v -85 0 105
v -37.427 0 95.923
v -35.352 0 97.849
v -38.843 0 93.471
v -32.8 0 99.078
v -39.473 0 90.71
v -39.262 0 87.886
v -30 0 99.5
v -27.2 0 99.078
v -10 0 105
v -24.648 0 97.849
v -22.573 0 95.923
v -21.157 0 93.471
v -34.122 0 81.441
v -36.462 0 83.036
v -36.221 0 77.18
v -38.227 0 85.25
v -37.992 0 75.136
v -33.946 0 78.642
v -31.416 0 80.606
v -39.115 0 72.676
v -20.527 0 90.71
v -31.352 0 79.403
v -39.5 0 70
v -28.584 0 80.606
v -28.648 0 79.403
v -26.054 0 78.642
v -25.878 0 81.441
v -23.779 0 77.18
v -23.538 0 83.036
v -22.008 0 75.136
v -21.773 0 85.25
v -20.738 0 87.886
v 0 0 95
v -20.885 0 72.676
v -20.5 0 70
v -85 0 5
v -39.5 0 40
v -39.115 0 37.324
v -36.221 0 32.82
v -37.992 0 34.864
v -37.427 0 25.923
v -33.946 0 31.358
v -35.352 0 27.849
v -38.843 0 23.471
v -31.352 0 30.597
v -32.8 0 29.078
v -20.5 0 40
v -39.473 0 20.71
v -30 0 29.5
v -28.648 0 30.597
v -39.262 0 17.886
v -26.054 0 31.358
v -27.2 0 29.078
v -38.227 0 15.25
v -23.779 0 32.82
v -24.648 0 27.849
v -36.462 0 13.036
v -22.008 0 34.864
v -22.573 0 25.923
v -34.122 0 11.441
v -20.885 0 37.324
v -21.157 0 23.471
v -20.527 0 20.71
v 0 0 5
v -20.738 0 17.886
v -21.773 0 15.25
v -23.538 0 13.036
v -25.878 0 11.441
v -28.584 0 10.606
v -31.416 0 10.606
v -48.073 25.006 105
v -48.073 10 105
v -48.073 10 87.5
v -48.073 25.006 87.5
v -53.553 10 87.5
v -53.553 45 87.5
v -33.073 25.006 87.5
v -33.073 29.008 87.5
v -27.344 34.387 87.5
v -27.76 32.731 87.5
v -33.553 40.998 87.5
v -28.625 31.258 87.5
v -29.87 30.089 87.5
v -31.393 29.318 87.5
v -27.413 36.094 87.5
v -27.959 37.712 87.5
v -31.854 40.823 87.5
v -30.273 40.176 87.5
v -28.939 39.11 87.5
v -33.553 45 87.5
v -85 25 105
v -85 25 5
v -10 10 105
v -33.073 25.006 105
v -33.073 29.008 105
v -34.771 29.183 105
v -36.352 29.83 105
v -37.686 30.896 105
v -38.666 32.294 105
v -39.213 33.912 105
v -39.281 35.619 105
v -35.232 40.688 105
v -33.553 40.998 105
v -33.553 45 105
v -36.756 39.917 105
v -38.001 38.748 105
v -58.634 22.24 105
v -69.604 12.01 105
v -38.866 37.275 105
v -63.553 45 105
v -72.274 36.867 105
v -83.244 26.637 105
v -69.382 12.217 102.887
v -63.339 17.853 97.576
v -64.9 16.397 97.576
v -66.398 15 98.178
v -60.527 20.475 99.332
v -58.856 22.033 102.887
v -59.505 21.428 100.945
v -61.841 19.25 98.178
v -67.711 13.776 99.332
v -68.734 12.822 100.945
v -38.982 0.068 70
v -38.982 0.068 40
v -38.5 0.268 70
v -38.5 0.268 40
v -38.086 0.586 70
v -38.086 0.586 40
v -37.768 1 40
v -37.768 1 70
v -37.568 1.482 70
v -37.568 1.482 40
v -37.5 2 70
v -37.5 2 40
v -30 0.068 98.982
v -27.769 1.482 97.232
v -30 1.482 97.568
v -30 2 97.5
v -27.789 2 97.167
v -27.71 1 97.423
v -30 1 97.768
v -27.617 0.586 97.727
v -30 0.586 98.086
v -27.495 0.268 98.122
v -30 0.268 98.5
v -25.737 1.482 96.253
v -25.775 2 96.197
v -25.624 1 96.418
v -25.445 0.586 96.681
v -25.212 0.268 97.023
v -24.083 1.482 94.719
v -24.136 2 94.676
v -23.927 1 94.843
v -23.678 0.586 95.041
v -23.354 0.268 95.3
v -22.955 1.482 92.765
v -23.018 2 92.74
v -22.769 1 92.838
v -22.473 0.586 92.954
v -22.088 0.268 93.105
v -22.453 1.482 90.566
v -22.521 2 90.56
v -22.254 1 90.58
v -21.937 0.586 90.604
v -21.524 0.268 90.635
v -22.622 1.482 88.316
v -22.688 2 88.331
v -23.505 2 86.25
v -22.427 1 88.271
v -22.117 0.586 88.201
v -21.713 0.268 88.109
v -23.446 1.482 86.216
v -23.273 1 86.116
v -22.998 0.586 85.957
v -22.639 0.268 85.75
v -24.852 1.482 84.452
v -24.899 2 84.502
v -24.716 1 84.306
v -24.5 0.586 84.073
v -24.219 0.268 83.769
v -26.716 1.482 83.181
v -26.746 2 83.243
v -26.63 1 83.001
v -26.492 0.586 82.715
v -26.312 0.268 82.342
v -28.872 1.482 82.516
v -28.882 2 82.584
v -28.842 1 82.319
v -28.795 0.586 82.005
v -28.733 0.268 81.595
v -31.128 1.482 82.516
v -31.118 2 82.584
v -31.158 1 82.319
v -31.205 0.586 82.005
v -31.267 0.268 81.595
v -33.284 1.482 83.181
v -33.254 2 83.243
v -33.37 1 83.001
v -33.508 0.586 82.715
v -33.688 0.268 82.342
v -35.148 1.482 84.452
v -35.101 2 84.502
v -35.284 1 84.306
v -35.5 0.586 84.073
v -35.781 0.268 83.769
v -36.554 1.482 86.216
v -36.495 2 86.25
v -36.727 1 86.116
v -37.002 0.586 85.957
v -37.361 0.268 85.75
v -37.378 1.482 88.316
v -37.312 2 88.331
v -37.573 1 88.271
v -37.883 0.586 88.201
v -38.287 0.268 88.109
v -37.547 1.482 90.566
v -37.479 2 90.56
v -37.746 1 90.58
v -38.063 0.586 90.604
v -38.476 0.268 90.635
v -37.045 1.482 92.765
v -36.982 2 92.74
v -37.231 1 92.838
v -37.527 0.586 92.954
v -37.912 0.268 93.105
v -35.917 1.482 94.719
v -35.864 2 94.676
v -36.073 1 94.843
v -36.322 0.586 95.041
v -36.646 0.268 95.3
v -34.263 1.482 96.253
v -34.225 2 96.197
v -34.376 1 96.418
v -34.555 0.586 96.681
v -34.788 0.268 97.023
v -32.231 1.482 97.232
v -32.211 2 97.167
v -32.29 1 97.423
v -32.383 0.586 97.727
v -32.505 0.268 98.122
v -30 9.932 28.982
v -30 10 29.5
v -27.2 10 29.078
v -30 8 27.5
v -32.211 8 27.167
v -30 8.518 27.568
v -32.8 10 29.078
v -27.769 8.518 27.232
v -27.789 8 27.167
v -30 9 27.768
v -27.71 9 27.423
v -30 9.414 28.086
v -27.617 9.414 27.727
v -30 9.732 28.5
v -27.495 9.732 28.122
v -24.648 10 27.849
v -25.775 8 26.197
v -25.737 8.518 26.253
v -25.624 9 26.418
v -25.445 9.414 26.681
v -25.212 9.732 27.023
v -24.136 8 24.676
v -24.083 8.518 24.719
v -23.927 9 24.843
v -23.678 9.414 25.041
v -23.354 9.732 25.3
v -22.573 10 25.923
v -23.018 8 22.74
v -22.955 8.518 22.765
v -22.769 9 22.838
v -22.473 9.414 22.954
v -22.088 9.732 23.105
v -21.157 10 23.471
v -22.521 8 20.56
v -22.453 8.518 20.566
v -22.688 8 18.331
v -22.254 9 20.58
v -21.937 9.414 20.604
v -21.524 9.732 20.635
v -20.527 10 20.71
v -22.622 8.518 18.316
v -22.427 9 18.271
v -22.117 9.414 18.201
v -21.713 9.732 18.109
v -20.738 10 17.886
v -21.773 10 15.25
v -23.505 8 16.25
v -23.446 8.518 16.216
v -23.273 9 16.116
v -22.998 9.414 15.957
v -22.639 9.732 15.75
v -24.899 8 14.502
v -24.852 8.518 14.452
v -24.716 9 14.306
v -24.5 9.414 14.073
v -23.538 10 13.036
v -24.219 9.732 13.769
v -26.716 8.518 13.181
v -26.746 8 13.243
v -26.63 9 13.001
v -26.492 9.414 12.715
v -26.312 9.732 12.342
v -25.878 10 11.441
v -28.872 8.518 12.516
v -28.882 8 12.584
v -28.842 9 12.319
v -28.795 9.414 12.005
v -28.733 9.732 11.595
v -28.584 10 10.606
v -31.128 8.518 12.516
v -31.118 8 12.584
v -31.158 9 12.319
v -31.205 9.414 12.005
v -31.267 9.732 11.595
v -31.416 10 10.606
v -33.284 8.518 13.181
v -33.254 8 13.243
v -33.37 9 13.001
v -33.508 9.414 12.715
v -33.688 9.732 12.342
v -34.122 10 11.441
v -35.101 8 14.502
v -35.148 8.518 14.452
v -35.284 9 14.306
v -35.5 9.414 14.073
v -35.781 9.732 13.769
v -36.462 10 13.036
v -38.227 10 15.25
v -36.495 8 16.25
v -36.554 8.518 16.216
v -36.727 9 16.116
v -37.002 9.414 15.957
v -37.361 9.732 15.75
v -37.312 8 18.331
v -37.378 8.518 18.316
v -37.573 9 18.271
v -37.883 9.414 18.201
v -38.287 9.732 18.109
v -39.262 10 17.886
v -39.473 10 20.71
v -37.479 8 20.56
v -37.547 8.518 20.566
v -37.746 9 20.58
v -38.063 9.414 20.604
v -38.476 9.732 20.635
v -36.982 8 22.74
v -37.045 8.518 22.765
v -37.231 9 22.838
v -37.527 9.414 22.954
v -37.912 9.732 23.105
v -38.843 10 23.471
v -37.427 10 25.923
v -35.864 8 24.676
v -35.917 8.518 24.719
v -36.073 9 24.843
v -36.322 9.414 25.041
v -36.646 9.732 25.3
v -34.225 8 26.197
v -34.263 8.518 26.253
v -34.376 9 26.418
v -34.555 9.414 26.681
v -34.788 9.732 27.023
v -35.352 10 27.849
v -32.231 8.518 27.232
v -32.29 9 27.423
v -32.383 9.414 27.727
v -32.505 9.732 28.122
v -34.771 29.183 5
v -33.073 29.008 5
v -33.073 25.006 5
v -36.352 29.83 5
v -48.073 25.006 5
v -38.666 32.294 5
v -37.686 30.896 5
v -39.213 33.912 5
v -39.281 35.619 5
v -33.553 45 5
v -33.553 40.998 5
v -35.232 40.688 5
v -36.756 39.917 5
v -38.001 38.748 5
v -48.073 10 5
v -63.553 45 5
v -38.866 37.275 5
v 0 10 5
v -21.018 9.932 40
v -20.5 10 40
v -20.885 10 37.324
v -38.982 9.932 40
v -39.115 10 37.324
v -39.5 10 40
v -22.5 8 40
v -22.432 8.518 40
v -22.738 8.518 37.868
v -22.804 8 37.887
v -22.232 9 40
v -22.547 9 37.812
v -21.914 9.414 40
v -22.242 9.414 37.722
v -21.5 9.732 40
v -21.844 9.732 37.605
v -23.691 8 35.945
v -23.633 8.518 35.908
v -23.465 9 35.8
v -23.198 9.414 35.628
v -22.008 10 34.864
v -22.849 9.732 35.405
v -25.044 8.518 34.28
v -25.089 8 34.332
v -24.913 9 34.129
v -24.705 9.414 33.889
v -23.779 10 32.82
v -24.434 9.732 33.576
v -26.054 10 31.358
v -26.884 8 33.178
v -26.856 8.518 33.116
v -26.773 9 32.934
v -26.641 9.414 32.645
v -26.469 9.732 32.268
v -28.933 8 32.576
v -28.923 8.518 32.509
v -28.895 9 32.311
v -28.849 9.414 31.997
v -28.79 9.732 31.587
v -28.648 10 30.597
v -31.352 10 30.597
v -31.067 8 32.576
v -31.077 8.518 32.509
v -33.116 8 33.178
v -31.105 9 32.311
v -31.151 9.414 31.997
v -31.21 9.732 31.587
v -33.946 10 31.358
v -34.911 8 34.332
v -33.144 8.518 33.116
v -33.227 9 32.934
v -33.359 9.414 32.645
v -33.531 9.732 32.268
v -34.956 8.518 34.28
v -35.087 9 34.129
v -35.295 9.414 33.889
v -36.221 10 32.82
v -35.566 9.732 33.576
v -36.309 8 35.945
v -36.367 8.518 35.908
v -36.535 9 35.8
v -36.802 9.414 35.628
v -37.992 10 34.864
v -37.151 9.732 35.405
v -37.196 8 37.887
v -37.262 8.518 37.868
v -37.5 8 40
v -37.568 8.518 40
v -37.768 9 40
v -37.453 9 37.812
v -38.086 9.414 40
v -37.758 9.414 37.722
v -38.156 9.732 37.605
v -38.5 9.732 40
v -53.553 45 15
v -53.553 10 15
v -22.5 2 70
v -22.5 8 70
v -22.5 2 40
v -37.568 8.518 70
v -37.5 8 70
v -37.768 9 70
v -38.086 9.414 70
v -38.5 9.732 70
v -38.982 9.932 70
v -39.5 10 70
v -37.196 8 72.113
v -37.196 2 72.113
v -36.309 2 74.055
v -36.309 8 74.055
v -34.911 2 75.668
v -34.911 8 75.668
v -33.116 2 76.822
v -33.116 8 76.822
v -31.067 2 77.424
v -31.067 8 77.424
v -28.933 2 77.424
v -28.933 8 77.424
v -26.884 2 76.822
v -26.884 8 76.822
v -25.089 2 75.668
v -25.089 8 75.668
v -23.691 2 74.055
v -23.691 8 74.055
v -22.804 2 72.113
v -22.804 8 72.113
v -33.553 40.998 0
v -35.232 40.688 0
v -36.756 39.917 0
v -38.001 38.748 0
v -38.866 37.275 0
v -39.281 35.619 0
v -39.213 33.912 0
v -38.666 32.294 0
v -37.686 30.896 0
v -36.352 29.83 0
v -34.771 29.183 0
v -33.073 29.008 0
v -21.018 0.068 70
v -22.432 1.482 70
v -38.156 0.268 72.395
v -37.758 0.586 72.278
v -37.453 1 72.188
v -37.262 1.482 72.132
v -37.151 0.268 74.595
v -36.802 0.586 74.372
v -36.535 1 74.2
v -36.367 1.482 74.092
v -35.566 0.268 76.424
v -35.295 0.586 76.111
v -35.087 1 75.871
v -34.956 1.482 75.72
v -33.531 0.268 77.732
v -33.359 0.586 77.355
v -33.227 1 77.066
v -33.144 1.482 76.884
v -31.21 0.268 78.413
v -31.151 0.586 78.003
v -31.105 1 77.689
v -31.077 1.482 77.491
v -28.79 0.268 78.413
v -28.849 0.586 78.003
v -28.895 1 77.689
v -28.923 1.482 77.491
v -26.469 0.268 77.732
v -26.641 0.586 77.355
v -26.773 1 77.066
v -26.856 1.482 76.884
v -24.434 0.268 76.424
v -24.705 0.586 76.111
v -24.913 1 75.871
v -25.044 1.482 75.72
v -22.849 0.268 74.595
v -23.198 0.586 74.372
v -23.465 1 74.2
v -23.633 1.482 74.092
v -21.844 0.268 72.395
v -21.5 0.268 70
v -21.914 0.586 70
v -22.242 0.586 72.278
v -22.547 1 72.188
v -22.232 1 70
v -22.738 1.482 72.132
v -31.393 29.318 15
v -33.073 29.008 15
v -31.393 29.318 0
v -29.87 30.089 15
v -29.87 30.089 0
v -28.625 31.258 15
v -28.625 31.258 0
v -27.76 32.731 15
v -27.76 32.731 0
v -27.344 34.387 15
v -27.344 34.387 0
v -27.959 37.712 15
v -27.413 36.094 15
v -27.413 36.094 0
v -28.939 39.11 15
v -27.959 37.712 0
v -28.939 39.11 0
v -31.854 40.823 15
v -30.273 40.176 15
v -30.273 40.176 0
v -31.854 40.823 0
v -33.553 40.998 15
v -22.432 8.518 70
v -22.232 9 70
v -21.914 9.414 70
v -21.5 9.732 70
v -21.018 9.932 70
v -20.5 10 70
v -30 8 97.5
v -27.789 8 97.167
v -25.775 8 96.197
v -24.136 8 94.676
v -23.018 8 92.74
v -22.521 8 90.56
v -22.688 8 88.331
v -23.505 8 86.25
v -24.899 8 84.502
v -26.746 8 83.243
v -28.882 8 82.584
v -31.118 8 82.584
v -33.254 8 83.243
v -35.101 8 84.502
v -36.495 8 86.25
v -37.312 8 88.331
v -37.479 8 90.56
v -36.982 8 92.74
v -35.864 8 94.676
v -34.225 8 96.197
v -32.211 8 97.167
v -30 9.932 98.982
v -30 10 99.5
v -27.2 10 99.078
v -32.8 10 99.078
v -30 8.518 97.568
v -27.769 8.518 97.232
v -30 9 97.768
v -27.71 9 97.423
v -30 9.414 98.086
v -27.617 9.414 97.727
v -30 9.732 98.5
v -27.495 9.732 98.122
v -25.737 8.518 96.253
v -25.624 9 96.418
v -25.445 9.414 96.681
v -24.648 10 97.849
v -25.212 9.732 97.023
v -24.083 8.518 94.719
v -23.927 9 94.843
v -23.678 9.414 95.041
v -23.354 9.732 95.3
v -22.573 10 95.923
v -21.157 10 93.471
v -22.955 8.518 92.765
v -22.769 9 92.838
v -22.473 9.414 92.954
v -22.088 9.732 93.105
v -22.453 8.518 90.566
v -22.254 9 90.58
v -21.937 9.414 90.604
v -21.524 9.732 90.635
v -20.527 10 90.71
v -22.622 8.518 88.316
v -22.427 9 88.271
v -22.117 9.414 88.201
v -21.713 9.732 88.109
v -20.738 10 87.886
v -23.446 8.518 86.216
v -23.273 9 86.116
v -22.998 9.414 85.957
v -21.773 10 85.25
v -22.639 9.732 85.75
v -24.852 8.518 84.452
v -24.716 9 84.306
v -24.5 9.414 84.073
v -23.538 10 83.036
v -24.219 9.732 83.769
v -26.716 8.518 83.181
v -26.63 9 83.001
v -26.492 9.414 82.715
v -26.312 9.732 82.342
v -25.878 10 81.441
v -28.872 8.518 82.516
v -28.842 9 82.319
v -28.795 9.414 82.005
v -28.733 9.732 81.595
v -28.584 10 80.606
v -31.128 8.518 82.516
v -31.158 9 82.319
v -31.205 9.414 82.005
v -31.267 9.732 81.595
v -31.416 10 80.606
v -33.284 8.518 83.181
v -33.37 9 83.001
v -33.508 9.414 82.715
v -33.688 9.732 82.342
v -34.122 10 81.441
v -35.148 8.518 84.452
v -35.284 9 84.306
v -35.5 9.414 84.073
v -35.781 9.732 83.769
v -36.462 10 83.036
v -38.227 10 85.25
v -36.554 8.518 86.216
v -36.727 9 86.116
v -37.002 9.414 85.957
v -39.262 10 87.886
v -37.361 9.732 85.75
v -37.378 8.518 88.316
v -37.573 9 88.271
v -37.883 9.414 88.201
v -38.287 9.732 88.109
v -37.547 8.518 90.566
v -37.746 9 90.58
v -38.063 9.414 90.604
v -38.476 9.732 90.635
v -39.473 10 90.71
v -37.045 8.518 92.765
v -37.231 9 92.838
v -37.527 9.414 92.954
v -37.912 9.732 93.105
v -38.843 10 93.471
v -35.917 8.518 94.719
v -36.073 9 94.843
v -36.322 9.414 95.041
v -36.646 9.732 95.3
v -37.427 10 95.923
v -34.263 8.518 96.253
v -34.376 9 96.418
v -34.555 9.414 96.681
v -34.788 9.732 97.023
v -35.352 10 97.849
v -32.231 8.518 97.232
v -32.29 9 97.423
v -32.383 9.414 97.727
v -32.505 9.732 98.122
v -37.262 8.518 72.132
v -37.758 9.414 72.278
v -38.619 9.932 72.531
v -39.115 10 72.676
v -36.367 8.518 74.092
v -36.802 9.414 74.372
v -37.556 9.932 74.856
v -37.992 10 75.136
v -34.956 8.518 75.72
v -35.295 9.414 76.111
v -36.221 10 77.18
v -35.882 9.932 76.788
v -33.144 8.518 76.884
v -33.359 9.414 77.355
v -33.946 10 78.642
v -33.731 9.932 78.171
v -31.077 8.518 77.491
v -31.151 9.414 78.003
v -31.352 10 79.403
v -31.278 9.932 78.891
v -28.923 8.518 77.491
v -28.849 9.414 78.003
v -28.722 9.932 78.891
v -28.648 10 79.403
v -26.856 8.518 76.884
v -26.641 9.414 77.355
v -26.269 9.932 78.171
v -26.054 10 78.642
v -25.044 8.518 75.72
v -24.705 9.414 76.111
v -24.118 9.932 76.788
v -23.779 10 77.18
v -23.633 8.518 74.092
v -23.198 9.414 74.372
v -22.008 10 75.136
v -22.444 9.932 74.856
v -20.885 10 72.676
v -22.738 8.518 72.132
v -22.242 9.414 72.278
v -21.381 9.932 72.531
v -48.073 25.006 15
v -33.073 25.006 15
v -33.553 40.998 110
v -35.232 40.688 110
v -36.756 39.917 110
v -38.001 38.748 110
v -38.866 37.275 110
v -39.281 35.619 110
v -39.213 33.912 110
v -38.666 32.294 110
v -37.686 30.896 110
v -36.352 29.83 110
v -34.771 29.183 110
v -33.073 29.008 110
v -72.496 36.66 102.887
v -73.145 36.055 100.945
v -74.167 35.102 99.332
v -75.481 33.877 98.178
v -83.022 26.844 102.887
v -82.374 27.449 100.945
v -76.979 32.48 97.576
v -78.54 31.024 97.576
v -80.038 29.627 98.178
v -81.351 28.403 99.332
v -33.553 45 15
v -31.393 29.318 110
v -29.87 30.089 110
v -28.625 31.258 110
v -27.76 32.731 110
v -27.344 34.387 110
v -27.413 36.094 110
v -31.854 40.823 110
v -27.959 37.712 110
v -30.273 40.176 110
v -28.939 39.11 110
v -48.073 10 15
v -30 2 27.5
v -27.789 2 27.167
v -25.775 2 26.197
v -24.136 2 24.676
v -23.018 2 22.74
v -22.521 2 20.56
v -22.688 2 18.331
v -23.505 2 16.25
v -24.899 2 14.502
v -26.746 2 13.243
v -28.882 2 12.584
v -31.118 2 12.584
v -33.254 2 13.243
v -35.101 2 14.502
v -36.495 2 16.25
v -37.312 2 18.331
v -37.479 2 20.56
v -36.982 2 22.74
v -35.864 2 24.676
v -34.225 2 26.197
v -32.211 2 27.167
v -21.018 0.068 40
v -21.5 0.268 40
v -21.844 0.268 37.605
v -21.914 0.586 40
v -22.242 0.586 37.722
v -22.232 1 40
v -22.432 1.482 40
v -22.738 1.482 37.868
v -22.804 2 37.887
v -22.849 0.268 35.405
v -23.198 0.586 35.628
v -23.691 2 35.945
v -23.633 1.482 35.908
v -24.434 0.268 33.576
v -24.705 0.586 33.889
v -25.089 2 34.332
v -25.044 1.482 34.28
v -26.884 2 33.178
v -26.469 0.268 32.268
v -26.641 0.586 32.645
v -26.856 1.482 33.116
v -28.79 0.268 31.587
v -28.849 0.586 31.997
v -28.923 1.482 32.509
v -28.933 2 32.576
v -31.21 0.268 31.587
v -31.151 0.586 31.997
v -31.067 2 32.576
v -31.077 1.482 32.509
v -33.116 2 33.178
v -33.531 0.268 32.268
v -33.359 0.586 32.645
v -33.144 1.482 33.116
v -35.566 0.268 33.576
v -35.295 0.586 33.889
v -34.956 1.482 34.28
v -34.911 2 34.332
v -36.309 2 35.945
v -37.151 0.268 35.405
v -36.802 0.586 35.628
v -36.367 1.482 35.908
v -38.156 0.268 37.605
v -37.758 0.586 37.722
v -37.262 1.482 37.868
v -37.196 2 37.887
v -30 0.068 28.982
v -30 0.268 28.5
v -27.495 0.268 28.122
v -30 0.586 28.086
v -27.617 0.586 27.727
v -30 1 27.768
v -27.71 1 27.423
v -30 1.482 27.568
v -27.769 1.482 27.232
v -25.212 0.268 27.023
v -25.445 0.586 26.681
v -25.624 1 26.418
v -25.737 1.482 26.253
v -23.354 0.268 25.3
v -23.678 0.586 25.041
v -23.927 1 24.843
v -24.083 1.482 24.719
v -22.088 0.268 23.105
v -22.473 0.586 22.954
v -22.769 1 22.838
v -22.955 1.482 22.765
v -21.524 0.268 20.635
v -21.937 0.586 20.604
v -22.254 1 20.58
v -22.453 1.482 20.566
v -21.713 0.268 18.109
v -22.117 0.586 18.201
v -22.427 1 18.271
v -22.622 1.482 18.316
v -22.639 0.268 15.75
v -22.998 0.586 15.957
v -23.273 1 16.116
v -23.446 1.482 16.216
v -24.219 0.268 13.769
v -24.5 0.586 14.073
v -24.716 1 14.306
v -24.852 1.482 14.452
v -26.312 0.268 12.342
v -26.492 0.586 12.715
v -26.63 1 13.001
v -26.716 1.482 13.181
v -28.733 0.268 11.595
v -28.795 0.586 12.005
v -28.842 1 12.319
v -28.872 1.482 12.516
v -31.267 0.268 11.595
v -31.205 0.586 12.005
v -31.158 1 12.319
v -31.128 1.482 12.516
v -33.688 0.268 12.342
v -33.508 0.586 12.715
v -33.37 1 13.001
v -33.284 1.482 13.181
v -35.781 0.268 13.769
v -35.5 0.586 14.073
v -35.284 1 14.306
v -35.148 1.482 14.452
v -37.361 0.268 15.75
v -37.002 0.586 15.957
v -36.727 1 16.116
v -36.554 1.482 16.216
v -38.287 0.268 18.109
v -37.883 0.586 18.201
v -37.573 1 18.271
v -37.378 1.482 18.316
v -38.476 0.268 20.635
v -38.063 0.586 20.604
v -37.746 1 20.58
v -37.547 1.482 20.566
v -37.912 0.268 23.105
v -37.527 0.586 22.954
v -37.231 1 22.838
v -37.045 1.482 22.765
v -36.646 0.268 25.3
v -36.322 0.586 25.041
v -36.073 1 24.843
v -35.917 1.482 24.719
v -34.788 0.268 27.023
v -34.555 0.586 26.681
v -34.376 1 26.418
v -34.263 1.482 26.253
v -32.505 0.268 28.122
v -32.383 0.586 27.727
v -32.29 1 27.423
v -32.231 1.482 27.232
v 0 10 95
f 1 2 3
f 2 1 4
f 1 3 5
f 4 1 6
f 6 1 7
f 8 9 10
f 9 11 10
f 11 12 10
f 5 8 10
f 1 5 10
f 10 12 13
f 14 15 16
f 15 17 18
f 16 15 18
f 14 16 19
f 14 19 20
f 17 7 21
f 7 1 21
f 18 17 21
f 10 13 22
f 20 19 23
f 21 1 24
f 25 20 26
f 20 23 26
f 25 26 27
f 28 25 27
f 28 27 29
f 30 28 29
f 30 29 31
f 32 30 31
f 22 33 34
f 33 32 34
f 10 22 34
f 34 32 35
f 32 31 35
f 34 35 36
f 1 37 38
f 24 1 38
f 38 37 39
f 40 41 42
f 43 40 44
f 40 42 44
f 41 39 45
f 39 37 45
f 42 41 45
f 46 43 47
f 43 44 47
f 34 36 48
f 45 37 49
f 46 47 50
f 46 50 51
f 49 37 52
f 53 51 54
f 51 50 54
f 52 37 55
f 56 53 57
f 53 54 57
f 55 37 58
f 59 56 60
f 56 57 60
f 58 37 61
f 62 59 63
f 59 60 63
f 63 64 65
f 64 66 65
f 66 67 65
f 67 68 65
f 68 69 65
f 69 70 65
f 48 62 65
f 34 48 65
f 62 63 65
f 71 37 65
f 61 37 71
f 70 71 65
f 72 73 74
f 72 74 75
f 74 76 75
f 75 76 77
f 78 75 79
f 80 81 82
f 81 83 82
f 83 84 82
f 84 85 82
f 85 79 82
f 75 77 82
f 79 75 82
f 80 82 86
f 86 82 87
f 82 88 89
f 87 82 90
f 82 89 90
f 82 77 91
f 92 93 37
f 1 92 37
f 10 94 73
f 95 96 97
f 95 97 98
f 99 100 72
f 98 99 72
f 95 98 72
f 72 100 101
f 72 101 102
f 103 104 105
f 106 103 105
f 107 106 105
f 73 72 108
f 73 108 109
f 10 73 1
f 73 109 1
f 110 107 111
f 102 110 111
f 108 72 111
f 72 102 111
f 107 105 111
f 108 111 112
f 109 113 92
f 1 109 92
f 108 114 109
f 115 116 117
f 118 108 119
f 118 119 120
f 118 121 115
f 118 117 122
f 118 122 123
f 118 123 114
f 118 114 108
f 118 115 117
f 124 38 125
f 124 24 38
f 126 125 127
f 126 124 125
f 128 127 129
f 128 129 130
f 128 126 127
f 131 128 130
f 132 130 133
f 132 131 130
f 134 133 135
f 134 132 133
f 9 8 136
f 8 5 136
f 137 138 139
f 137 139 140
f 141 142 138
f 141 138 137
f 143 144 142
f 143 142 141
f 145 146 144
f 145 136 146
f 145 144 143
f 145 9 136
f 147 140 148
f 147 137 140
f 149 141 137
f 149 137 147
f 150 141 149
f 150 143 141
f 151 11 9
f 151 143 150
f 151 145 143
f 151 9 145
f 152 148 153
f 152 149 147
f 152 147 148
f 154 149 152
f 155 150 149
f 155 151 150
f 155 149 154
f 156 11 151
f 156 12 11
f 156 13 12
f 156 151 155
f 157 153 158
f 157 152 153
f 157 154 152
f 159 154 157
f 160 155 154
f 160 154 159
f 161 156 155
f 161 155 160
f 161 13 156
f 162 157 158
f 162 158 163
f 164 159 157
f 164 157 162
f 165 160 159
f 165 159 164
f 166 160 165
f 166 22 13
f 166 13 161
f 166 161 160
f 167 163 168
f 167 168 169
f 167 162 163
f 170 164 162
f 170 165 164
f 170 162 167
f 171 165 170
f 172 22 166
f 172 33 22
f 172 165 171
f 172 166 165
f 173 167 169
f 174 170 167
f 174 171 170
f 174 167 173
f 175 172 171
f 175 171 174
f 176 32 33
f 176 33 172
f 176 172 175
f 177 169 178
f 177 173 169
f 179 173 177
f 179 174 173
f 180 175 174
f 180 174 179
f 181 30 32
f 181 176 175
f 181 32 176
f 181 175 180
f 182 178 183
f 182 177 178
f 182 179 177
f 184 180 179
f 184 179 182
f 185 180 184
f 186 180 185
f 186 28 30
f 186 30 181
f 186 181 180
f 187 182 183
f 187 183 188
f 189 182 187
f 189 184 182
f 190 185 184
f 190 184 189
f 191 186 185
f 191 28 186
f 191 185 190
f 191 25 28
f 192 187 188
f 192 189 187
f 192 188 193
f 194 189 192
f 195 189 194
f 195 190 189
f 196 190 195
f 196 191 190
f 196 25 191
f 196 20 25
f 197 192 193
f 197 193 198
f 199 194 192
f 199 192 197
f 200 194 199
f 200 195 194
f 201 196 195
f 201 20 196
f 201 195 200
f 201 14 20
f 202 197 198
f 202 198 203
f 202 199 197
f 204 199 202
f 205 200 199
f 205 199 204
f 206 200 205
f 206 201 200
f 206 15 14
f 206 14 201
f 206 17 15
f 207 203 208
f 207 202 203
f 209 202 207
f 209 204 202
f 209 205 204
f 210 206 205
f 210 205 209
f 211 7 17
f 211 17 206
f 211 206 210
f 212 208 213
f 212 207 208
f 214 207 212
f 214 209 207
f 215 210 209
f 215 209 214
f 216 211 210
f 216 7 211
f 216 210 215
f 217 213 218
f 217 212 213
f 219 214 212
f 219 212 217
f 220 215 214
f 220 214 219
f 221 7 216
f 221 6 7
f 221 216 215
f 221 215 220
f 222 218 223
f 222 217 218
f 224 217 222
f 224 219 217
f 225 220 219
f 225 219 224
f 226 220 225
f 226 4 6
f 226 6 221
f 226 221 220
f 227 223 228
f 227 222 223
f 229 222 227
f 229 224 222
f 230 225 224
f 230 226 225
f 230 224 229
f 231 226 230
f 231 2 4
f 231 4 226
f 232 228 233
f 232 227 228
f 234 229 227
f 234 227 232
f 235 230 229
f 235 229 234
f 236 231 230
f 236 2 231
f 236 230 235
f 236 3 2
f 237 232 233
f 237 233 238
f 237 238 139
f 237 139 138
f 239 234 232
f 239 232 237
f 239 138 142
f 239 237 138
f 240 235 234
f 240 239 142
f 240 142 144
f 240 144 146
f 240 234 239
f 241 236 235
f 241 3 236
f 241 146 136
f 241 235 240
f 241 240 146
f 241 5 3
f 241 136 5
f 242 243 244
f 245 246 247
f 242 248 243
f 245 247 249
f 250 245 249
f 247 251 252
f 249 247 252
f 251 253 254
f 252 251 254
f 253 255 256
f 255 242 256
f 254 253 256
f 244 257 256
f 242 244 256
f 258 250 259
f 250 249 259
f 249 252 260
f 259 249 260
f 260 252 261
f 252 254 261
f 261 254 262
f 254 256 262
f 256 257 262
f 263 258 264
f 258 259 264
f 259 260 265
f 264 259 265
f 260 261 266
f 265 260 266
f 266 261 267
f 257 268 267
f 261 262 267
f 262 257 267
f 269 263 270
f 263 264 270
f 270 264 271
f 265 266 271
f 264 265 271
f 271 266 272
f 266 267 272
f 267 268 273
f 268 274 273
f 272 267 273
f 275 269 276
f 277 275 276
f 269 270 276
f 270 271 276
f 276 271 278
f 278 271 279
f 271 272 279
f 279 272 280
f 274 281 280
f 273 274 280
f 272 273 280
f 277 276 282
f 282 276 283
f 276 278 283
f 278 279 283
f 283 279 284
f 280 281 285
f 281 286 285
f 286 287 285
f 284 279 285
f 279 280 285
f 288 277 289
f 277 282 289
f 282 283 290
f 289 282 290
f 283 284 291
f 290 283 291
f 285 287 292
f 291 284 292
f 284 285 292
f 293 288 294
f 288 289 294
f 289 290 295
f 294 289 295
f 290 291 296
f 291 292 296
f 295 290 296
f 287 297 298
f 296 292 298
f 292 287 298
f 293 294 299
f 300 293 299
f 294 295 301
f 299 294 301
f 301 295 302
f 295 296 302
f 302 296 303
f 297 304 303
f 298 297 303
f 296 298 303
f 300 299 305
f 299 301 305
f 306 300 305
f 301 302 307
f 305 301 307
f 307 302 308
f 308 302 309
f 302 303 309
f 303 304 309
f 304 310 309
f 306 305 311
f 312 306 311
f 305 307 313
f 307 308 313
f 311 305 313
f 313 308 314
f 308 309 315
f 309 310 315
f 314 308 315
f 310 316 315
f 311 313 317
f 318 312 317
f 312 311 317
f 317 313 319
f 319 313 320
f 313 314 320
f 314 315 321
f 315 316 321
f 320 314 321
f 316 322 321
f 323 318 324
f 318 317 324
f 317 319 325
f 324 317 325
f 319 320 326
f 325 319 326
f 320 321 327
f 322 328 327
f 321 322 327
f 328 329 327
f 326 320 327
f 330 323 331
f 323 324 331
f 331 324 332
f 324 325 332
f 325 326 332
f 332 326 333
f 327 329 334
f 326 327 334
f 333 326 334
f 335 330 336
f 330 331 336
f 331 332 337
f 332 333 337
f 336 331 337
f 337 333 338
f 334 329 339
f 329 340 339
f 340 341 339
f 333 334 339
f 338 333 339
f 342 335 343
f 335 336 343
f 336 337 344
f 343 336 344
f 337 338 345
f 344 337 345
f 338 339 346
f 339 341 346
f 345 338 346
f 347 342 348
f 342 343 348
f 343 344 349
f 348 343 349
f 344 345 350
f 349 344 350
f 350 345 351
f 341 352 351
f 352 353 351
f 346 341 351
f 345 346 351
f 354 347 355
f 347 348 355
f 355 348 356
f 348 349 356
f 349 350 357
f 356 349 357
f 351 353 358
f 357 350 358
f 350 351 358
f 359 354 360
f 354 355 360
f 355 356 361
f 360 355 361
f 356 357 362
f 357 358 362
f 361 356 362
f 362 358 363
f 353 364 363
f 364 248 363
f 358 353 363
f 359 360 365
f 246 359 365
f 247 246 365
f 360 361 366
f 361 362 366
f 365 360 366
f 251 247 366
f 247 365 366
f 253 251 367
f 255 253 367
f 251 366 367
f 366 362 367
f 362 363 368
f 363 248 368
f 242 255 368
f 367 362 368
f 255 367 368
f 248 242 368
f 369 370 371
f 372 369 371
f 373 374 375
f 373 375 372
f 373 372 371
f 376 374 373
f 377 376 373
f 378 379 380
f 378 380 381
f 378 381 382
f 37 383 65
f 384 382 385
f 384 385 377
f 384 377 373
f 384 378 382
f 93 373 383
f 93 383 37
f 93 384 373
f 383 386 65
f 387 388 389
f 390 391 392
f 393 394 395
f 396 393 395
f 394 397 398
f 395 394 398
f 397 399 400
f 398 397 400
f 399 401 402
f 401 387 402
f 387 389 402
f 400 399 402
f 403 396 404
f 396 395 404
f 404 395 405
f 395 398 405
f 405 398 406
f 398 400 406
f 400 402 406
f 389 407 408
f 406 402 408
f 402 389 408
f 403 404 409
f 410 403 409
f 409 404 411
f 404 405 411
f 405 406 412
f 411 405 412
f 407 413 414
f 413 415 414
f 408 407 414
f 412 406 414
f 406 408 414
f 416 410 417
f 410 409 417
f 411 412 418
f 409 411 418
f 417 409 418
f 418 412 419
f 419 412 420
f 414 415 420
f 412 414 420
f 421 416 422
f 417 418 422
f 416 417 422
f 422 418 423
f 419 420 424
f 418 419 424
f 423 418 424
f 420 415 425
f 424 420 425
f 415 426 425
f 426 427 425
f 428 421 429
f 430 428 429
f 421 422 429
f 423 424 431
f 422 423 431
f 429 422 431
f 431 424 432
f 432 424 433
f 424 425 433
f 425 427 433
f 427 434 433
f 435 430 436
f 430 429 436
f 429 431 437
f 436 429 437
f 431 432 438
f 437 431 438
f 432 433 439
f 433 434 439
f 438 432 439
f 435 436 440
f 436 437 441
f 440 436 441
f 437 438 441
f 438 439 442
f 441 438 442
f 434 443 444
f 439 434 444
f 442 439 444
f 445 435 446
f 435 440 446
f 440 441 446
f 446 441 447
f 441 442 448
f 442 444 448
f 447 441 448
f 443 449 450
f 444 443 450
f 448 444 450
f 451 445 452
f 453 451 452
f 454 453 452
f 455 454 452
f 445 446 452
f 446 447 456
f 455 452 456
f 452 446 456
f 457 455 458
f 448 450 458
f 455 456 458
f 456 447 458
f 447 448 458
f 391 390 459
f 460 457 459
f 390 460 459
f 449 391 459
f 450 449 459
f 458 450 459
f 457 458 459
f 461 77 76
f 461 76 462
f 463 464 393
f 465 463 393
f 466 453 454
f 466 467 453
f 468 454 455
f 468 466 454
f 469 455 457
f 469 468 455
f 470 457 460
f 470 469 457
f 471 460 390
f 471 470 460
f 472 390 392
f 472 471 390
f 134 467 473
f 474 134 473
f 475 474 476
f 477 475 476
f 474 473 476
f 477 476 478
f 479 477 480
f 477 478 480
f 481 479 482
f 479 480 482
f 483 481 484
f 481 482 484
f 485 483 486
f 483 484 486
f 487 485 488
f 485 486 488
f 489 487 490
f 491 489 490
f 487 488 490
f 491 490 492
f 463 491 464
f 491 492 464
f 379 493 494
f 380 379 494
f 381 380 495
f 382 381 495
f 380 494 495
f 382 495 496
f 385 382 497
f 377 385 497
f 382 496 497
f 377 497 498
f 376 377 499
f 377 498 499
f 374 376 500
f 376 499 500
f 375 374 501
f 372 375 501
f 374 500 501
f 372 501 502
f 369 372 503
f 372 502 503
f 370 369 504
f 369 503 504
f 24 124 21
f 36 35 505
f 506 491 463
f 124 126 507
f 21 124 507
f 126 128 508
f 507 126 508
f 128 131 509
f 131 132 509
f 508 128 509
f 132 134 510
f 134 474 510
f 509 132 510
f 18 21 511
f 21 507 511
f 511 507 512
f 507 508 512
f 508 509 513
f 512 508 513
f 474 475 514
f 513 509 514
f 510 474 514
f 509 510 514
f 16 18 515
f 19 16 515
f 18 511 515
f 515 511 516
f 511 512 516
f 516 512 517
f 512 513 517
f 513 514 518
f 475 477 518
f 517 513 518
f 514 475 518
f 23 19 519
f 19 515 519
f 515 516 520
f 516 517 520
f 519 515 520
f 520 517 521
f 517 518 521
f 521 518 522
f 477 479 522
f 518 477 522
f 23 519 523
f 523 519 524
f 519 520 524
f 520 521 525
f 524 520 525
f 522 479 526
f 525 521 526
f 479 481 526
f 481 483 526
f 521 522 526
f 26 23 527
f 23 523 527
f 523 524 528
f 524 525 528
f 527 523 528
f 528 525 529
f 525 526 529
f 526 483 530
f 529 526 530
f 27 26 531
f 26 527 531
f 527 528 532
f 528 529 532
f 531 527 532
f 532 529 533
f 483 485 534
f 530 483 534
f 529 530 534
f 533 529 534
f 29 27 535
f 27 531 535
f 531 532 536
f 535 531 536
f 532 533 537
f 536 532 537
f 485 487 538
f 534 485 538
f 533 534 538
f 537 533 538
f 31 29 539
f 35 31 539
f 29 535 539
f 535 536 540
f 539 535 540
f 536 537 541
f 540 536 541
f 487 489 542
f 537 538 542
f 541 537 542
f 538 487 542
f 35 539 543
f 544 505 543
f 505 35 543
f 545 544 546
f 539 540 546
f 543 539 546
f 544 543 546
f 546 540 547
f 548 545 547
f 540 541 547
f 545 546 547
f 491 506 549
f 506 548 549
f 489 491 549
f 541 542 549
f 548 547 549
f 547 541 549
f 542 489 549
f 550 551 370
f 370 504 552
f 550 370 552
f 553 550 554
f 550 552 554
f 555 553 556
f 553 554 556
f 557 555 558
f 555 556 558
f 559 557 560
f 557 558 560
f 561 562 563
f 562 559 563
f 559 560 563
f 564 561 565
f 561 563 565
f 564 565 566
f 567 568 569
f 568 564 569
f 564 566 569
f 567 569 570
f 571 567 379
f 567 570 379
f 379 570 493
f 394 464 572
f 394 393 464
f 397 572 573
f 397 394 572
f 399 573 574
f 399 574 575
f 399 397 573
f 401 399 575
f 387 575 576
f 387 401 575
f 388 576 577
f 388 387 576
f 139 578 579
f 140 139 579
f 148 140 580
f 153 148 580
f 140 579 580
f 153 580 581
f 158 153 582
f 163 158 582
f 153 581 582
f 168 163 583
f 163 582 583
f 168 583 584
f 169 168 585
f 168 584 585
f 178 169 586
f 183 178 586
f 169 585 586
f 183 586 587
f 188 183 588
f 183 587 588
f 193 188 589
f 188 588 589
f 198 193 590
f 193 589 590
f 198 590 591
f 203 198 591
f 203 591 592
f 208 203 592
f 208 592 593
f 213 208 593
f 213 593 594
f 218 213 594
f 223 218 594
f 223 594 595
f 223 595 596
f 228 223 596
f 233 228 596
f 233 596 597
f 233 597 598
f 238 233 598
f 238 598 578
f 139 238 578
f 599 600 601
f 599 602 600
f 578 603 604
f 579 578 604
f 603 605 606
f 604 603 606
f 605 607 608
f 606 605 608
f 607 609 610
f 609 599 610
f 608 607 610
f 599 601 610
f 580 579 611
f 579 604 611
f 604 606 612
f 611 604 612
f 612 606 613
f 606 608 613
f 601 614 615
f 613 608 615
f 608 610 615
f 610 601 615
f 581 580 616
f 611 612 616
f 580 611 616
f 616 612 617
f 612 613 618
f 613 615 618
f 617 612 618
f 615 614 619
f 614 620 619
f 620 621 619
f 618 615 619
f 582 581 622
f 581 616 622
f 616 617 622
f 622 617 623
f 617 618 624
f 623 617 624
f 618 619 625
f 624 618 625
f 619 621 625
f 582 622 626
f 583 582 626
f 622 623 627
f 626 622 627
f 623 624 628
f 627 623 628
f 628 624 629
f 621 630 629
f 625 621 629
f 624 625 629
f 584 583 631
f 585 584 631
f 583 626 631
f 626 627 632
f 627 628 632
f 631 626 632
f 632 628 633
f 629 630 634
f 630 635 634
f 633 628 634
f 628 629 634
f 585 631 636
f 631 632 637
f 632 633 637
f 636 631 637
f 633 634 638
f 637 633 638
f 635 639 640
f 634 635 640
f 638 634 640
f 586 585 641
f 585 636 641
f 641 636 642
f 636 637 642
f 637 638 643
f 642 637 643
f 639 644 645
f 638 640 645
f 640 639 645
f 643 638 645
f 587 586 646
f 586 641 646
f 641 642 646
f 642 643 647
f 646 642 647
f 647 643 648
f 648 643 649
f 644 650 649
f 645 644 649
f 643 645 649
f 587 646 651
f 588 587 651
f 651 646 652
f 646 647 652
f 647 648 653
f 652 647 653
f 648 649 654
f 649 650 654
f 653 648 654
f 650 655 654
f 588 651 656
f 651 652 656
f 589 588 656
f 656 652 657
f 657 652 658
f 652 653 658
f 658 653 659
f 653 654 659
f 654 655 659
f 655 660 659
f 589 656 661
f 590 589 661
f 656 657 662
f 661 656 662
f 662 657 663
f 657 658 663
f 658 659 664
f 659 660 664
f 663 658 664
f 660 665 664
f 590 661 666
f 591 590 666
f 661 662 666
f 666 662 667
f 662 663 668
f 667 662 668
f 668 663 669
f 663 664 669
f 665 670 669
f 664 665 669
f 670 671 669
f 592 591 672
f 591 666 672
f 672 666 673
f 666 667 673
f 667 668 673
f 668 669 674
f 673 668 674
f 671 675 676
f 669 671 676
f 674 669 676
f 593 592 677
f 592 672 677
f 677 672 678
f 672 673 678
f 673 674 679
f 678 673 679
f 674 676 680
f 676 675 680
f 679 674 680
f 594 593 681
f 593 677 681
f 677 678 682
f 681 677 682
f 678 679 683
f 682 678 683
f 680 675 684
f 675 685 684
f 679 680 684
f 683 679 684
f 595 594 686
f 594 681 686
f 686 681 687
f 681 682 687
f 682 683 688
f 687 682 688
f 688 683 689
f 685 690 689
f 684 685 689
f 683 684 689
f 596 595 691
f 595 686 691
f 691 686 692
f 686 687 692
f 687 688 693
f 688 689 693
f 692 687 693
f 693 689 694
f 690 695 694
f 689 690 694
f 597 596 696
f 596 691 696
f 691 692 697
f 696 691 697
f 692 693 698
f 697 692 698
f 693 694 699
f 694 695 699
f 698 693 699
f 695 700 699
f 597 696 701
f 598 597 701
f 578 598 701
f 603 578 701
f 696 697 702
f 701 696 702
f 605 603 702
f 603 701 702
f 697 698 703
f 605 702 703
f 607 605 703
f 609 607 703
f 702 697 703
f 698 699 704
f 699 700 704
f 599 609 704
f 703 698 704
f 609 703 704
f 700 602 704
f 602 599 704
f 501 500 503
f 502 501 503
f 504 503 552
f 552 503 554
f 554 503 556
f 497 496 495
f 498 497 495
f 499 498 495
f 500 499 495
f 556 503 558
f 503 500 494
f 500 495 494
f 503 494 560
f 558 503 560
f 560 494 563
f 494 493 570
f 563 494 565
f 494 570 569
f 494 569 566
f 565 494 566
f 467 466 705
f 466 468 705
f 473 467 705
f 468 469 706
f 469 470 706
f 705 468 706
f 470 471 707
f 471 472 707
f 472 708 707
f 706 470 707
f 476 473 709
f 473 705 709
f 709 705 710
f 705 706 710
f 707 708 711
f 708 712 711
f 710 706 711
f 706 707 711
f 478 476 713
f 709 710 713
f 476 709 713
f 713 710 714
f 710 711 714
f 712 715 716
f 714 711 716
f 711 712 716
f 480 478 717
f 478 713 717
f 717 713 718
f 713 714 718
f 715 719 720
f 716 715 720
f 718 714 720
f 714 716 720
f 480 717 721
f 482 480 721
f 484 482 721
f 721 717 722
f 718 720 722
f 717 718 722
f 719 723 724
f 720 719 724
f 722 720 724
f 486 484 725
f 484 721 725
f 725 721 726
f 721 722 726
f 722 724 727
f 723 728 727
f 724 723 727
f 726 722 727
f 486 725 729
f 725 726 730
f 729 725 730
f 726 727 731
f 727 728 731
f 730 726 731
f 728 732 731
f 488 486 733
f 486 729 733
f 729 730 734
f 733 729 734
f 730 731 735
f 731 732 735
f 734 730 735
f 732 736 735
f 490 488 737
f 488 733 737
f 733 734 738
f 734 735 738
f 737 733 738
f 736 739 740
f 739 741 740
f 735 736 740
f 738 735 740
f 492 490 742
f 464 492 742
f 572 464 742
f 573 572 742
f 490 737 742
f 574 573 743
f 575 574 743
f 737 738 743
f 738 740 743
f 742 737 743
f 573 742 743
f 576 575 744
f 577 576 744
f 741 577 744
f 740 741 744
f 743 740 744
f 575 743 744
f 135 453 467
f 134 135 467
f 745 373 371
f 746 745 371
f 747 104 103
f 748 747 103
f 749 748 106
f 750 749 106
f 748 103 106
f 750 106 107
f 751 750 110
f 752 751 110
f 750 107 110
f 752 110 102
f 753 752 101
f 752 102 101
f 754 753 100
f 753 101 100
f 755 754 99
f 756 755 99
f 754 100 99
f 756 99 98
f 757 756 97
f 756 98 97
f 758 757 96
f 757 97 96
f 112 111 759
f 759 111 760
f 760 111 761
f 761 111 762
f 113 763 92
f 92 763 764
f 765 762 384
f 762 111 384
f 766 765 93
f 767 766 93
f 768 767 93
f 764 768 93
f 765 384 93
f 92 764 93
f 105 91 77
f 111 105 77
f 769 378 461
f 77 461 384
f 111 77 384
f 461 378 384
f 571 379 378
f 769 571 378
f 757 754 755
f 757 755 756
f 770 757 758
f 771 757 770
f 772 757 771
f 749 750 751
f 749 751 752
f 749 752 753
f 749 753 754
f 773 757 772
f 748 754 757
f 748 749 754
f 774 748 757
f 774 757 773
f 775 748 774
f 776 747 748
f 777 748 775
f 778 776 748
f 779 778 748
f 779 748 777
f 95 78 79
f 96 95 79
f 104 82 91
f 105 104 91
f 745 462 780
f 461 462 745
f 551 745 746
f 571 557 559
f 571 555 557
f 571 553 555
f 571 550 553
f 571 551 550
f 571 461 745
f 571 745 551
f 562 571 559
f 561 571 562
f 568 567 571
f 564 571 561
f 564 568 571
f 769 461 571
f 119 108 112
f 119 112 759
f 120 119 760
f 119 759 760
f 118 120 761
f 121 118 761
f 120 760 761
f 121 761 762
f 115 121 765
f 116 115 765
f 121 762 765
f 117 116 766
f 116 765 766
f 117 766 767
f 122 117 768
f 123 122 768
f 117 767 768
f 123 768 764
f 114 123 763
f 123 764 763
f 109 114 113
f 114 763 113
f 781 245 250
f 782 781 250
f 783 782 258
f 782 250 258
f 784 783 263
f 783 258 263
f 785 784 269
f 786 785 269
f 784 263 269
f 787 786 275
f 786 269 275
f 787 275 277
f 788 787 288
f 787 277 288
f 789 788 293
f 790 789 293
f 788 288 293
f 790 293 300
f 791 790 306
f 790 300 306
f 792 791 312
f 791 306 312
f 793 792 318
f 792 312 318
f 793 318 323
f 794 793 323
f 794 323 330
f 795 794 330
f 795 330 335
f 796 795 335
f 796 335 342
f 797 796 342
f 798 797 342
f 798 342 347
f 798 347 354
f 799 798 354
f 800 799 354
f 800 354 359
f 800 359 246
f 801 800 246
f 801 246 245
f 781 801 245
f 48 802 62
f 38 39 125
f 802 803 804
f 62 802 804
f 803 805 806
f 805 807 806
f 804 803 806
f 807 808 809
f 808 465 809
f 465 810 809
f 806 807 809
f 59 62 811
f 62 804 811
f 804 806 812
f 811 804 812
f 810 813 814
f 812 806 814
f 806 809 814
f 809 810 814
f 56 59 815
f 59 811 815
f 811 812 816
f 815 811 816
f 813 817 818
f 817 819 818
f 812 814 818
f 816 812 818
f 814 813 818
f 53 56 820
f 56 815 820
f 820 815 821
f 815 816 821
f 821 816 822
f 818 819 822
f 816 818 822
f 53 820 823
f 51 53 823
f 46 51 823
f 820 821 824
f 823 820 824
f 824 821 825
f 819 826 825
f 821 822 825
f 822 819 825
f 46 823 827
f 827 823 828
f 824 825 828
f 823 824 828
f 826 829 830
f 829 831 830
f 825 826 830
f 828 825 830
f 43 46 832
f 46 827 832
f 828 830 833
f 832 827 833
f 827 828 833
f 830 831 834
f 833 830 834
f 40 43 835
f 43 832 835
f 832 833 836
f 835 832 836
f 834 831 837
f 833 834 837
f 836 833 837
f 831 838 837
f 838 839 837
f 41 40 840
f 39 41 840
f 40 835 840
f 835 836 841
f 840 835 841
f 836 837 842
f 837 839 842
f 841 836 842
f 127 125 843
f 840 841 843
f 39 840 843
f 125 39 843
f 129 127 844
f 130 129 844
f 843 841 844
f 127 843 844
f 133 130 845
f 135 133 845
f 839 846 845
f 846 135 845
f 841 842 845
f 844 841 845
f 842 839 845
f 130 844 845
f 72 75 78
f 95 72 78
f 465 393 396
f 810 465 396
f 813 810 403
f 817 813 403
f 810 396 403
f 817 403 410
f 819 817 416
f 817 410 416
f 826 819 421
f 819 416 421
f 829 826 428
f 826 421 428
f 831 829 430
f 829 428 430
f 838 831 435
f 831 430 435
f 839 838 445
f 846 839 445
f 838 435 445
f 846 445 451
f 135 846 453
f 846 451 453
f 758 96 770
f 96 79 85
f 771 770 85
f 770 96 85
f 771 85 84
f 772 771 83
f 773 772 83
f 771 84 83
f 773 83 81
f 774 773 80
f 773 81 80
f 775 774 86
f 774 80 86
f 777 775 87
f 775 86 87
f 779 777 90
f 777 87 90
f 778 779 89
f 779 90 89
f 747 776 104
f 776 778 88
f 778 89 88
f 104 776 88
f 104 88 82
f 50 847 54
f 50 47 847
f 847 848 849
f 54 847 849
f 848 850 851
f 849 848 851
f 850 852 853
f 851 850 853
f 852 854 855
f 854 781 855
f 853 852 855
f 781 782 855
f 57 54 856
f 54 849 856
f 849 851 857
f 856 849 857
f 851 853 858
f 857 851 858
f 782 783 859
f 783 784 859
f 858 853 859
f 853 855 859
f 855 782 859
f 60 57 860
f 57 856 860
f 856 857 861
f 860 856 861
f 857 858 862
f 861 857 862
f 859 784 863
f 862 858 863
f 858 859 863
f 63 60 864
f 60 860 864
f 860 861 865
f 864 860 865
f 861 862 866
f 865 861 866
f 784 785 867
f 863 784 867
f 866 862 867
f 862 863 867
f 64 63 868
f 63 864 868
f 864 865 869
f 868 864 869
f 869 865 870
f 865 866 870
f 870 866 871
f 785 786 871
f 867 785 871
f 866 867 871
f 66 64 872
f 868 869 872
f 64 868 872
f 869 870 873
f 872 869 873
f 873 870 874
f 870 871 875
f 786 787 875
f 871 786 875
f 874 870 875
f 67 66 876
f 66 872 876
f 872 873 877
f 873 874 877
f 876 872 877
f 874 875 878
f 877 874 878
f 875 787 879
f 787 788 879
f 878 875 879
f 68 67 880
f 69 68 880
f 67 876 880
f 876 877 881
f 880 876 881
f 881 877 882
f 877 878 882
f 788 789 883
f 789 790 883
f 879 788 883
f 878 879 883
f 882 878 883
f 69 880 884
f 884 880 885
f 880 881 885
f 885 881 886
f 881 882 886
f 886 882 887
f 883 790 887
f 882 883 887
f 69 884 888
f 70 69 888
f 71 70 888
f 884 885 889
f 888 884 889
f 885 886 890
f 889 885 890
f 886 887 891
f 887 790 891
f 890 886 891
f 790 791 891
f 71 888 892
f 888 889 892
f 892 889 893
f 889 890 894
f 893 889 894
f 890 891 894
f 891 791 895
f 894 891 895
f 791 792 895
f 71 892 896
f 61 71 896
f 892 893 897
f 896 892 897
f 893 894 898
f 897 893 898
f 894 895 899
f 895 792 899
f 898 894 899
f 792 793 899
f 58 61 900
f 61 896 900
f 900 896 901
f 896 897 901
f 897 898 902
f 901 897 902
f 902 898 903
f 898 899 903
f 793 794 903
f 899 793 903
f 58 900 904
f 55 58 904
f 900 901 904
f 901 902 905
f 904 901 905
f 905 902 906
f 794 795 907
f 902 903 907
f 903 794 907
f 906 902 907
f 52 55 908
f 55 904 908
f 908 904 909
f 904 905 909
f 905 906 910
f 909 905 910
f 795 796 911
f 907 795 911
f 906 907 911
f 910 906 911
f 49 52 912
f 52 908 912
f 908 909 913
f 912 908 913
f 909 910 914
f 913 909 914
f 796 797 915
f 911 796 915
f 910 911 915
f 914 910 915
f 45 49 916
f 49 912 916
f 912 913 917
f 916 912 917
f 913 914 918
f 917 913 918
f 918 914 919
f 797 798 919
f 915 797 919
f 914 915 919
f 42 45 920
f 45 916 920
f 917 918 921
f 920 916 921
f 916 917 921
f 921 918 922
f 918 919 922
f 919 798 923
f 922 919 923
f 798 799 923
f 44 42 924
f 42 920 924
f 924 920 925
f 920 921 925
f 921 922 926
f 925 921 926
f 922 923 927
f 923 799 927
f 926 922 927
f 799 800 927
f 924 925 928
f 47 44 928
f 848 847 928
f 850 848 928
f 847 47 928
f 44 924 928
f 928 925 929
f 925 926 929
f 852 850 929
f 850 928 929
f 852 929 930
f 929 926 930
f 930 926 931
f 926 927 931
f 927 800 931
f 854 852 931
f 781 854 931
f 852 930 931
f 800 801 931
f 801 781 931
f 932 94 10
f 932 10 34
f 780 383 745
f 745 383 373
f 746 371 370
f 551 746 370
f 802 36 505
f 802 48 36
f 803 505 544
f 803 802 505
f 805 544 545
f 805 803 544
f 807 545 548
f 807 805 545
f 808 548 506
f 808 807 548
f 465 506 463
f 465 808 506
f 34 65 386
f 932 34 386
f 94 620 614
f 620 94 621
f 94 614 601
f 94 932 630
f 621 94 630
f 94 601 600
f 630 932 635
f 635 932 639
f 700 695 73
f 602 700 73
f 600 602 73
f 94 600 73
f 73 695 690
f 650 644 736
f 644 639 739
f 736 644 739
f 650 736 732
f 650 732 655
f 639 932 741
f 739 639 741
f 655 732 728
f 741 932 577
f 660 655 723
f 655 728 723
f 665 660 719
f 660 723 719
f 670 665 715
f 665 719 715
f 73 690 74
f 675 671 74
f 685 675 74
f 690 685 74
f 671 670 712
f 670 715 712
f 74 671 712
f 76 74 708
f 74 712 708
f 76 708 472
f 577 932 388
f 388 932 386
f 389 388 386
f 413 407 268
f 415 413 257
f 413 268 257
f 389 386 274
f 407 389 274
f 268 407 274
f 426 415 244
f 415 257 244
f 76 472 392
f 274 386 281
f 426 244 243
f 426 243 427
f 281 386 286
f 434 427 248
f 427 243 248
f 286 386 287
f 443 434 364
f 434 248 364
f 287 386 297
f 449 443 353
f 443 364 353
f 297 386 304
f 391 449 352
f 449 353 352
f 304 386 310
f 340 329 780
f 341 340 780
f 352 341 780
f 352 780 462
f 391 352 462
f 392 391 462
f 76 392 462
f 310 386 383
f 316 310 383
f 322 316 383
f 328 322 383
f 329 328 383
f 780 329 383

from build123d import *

# Parameters (mm, degrees)
ESQUISSE1_R             = 6
BOSS_EXTRU_1_DEPTH      = 110
ENL_V_MAT_EXTRU_1_DEPTH = 5
ENL_V_START             = -5
ENL_V_MAT_EXTRU_2_DEPTH = 5
ENL_V_MAT_EXTRU_4_REACH = 148.116
ESQUISSE5_W             = 37.986809269
ESQUISSE5_H             = 72.5
ESQUISSE6_R             = 7.5
ENL_V_MAT_EXTRU_5_DEPTH = 20
ESQUISSE7_R             = 7.5
ENL_V_MAT_EXTRU_6_DEPTH = 20
CONG_1_R                = 2
CONG_2_R                = 2


with BuildPart() as part:
    # Esquisse1 → Boss.-Extru.1 (new body)
    with BuildSketch(Plane.XY):
        with BuildLine():
            Line((-85, 0), (0, 0))
            Line((0, 0), (0, 10))
            Line((0, 10), (-48.072706324, 10))
            Line((-48.072706324, 10), (-48.072706324, 25.005758897))
            Line((-48.072706324, 25.005758897), (-33.072706324, 25.005758897))
            Line((-33.072706324, 25.005758897), (-33.072706324, 29.007679758))
            ThreePointArc((-33.072706324, 29.007679758), (-39.307865752, 34.762919711), (-33.5526258, 40.998079138))
            Line((-33.5526258, 40.998079138), (-33.5526258, 45))
            Line((-33.5526258, 45), (-63.5526258, 45))
            Line((-63.5526258, 45), (-85, 25))
            Line((-85, 25), (-85, 0))
        make_face()
        with Locations((-33.312666062, 35.002879448)):
            Circle(ESQUISSE1_R)
    extrude(amount=BOSS_EXTRU_1_DEPTH)

    # Esquisse2 → Enlèv. mat.-Extru.1 (cut)
    with BuildSketch(Plane(origin=(0, 0, 0), x_dir=(-1, 0, 0), z_dir=(0, 0, -1))):
        with BuildLine():
            Line((33.5526258, 45), (33.5526258, 40.998079138))
            ThreePointArc((33.5526258, 40.998079138), (39.307865752, 34.762919711), (33.072706324, 29.007679758))
            Line((33.072706324, 29.007679758), (33.072706324, 25.005758897))
            Line((33.072706324, 25.005758897), (48.072706324, 25.005758897))
            Line((48.072706324, 25.005758897), (48.072706324, 10))
            Line((48.072706324, 10), (0, 10))
            Line((0, 10), (0, 0))
            Line((0, 0), (85, 0))
            Line((85, 0), (85, 25))
            Line((85, 25), (63.5526258, 45))
            Line((63.5526258, 45), (33.5526258, 45))
        make_face()
    extrude(amount=-ENL_V_MAT_EXTRU_1_DEPTH, mode=Mode.SUBTRACT)

    # Esquisse3 → Enlèv. mat.-Extru.2 (cut)
    with BuildSketch(Plane.XY.offset(110).offset(ENL_V_START)):
        with BuildLine():
            Line((-33.5526258, 45), (-33.5526258, 40.998079138))
            ThreePointArc((-33.5526258, 40.998079138), (-39.307865752, 34.762919711), (-33.072706324, 29.007679758))
            Line((-33.072706324, 29.007679758), (-33.072706324, 25.005758897))
            Line((-33.072706324, 25.005758897), (-48.072706324, 25.005758897))
            Line((-48.072706324, 25.005758897), (-48.072706324, 10))
            Line((-48.072706324, 10), (0, 10))
            Line((0, 10), (0, 0))
            Line((0, 0), (-85, 0))
            Line((-85, 0), (-85, 25))
            Line((-85, 25), (-63.5526258, 45))
            Line((-63.5526258, 45), (-33.5526258, 45))
        make_face()
    extrude(amount=ENL_V_MAT_EXTRU_2_DEPTH, mode=Mode.SUBTRACT)

    # Enlèv. mat.-Extru.4: up to this face of the body (flat: up to its plane)
    enl_v_mat_extru_4_end = Plane(part.part.faces().sort_by_distance((-24.036353162, 10, 55))[0])
    # Esquisse5 → Enlèv. mat.-Extru.4 (cut, up to the picked face)
    with BuildSketch(Plane(origin=(0, 45, 0), x_dir=(1, 0, 0), z_dir=(0, 1, 0)), mode=Mode.PRIVATE) as enl_v_mat_extru_4_sk1:
        with Locations((-34.559221165, -51.25)):
            Rectangle(ESQUISSE5_W, ESQUISSE5_H)
    enl_v_mat_extru_4_tool1 = split(extrude(enl_v_mat_extru_4_sk1.sketch, amount=-ENL_V_MAT_EXTRU_4_REACH, mode=Mode.PRIVATE), bisect_by=enl_v_mat_extru_4_end, keep=Keep.BOTH, mode=Mode.PRIVATE)
    add(enl_v_mat_extru_4_tool1.solids().sort_by(Axis((-34.559221, 45, 51.25), (0, -1, 0)))[0], mode=Mode.SUBTRACT)

    # Esquisse6 → Enlèv. mat.-Extru.5 (cut)
    with BuildSketch(Plane(origin=(-52.004900494, 55.768428058, 0), x_dir=(0.7313537016191718, 0.6819983600624971, 0), z_dir=(-0.6819983600624971, 0.7313537016191718, 0))):
        with Locations((-35.214521923, -105)):
            Circle(ESQUISSE6_R)
    extrude(amount=-ENL_V_MAT_EXTRU_5_DEPTH, mode=Mode.SUBTRACT)

    # Esquisse7 → Enlèv. mat.-Extru.6 (cut)
    with BuildSketch(Plane(origin=(0, 10, 0), x_dir=(1, 0, 0), z_dir=(0, 1, 0))):
        with Locations(Location((-30, -20, 0), (0, 0, 270))):
            Circle(ESQUISSE7_R)
        with Locations(Location((-30, -90, 0), (0, 0, 270))):
            Circle(ESQUISSE7_R)
        with BuildLine():
            Line((-37.5, -40), (-37.5, -70))
            ThreePointArc((-37.5, -70), (-30, -77.5), (-22.5, -70))
            Line((-22.5, -70), (-22.5, -40))
            ThreePointArc((-22.5, -40), (-30, -32.5), (-37.5, -40))
        make_face()
        Polygon((-10, -105), (0, -95), (0, -105), align=None)
    extrude(amount=-ENL_V_MAT_EXTRU_6_DEPTH, mode=Mode.SUBTRACT)

    # Congé1
    cong_1_edges = [part.edges().sort_by_distance(p)[0] for p in [
        (-30, 10, 12.5),
        (-22.5, 10, 55),
        (-37.5, 10, 55),
        (-30, 10, 77.5),
        (-30, 10, 32.5),
        (-30, 10, 82.5),
    ]]
    fillet(cong_1_edges, radius=CONG_1_R)

    # Congé2
    cong_2_edges = [part.edges().sort_by_distance(p)[0] for p in [
        (-30, 0, 12.5),
        (-37.5, 0, 55),
        (-30, 0, 32.5),
        (-30, 0, 77.5),
        (-22.5, 0, 55),
        (-30, 0, 82.5),
    ]]
    fillet(cong_2_edges, radius=CONG_2_R)


solid = part.part
